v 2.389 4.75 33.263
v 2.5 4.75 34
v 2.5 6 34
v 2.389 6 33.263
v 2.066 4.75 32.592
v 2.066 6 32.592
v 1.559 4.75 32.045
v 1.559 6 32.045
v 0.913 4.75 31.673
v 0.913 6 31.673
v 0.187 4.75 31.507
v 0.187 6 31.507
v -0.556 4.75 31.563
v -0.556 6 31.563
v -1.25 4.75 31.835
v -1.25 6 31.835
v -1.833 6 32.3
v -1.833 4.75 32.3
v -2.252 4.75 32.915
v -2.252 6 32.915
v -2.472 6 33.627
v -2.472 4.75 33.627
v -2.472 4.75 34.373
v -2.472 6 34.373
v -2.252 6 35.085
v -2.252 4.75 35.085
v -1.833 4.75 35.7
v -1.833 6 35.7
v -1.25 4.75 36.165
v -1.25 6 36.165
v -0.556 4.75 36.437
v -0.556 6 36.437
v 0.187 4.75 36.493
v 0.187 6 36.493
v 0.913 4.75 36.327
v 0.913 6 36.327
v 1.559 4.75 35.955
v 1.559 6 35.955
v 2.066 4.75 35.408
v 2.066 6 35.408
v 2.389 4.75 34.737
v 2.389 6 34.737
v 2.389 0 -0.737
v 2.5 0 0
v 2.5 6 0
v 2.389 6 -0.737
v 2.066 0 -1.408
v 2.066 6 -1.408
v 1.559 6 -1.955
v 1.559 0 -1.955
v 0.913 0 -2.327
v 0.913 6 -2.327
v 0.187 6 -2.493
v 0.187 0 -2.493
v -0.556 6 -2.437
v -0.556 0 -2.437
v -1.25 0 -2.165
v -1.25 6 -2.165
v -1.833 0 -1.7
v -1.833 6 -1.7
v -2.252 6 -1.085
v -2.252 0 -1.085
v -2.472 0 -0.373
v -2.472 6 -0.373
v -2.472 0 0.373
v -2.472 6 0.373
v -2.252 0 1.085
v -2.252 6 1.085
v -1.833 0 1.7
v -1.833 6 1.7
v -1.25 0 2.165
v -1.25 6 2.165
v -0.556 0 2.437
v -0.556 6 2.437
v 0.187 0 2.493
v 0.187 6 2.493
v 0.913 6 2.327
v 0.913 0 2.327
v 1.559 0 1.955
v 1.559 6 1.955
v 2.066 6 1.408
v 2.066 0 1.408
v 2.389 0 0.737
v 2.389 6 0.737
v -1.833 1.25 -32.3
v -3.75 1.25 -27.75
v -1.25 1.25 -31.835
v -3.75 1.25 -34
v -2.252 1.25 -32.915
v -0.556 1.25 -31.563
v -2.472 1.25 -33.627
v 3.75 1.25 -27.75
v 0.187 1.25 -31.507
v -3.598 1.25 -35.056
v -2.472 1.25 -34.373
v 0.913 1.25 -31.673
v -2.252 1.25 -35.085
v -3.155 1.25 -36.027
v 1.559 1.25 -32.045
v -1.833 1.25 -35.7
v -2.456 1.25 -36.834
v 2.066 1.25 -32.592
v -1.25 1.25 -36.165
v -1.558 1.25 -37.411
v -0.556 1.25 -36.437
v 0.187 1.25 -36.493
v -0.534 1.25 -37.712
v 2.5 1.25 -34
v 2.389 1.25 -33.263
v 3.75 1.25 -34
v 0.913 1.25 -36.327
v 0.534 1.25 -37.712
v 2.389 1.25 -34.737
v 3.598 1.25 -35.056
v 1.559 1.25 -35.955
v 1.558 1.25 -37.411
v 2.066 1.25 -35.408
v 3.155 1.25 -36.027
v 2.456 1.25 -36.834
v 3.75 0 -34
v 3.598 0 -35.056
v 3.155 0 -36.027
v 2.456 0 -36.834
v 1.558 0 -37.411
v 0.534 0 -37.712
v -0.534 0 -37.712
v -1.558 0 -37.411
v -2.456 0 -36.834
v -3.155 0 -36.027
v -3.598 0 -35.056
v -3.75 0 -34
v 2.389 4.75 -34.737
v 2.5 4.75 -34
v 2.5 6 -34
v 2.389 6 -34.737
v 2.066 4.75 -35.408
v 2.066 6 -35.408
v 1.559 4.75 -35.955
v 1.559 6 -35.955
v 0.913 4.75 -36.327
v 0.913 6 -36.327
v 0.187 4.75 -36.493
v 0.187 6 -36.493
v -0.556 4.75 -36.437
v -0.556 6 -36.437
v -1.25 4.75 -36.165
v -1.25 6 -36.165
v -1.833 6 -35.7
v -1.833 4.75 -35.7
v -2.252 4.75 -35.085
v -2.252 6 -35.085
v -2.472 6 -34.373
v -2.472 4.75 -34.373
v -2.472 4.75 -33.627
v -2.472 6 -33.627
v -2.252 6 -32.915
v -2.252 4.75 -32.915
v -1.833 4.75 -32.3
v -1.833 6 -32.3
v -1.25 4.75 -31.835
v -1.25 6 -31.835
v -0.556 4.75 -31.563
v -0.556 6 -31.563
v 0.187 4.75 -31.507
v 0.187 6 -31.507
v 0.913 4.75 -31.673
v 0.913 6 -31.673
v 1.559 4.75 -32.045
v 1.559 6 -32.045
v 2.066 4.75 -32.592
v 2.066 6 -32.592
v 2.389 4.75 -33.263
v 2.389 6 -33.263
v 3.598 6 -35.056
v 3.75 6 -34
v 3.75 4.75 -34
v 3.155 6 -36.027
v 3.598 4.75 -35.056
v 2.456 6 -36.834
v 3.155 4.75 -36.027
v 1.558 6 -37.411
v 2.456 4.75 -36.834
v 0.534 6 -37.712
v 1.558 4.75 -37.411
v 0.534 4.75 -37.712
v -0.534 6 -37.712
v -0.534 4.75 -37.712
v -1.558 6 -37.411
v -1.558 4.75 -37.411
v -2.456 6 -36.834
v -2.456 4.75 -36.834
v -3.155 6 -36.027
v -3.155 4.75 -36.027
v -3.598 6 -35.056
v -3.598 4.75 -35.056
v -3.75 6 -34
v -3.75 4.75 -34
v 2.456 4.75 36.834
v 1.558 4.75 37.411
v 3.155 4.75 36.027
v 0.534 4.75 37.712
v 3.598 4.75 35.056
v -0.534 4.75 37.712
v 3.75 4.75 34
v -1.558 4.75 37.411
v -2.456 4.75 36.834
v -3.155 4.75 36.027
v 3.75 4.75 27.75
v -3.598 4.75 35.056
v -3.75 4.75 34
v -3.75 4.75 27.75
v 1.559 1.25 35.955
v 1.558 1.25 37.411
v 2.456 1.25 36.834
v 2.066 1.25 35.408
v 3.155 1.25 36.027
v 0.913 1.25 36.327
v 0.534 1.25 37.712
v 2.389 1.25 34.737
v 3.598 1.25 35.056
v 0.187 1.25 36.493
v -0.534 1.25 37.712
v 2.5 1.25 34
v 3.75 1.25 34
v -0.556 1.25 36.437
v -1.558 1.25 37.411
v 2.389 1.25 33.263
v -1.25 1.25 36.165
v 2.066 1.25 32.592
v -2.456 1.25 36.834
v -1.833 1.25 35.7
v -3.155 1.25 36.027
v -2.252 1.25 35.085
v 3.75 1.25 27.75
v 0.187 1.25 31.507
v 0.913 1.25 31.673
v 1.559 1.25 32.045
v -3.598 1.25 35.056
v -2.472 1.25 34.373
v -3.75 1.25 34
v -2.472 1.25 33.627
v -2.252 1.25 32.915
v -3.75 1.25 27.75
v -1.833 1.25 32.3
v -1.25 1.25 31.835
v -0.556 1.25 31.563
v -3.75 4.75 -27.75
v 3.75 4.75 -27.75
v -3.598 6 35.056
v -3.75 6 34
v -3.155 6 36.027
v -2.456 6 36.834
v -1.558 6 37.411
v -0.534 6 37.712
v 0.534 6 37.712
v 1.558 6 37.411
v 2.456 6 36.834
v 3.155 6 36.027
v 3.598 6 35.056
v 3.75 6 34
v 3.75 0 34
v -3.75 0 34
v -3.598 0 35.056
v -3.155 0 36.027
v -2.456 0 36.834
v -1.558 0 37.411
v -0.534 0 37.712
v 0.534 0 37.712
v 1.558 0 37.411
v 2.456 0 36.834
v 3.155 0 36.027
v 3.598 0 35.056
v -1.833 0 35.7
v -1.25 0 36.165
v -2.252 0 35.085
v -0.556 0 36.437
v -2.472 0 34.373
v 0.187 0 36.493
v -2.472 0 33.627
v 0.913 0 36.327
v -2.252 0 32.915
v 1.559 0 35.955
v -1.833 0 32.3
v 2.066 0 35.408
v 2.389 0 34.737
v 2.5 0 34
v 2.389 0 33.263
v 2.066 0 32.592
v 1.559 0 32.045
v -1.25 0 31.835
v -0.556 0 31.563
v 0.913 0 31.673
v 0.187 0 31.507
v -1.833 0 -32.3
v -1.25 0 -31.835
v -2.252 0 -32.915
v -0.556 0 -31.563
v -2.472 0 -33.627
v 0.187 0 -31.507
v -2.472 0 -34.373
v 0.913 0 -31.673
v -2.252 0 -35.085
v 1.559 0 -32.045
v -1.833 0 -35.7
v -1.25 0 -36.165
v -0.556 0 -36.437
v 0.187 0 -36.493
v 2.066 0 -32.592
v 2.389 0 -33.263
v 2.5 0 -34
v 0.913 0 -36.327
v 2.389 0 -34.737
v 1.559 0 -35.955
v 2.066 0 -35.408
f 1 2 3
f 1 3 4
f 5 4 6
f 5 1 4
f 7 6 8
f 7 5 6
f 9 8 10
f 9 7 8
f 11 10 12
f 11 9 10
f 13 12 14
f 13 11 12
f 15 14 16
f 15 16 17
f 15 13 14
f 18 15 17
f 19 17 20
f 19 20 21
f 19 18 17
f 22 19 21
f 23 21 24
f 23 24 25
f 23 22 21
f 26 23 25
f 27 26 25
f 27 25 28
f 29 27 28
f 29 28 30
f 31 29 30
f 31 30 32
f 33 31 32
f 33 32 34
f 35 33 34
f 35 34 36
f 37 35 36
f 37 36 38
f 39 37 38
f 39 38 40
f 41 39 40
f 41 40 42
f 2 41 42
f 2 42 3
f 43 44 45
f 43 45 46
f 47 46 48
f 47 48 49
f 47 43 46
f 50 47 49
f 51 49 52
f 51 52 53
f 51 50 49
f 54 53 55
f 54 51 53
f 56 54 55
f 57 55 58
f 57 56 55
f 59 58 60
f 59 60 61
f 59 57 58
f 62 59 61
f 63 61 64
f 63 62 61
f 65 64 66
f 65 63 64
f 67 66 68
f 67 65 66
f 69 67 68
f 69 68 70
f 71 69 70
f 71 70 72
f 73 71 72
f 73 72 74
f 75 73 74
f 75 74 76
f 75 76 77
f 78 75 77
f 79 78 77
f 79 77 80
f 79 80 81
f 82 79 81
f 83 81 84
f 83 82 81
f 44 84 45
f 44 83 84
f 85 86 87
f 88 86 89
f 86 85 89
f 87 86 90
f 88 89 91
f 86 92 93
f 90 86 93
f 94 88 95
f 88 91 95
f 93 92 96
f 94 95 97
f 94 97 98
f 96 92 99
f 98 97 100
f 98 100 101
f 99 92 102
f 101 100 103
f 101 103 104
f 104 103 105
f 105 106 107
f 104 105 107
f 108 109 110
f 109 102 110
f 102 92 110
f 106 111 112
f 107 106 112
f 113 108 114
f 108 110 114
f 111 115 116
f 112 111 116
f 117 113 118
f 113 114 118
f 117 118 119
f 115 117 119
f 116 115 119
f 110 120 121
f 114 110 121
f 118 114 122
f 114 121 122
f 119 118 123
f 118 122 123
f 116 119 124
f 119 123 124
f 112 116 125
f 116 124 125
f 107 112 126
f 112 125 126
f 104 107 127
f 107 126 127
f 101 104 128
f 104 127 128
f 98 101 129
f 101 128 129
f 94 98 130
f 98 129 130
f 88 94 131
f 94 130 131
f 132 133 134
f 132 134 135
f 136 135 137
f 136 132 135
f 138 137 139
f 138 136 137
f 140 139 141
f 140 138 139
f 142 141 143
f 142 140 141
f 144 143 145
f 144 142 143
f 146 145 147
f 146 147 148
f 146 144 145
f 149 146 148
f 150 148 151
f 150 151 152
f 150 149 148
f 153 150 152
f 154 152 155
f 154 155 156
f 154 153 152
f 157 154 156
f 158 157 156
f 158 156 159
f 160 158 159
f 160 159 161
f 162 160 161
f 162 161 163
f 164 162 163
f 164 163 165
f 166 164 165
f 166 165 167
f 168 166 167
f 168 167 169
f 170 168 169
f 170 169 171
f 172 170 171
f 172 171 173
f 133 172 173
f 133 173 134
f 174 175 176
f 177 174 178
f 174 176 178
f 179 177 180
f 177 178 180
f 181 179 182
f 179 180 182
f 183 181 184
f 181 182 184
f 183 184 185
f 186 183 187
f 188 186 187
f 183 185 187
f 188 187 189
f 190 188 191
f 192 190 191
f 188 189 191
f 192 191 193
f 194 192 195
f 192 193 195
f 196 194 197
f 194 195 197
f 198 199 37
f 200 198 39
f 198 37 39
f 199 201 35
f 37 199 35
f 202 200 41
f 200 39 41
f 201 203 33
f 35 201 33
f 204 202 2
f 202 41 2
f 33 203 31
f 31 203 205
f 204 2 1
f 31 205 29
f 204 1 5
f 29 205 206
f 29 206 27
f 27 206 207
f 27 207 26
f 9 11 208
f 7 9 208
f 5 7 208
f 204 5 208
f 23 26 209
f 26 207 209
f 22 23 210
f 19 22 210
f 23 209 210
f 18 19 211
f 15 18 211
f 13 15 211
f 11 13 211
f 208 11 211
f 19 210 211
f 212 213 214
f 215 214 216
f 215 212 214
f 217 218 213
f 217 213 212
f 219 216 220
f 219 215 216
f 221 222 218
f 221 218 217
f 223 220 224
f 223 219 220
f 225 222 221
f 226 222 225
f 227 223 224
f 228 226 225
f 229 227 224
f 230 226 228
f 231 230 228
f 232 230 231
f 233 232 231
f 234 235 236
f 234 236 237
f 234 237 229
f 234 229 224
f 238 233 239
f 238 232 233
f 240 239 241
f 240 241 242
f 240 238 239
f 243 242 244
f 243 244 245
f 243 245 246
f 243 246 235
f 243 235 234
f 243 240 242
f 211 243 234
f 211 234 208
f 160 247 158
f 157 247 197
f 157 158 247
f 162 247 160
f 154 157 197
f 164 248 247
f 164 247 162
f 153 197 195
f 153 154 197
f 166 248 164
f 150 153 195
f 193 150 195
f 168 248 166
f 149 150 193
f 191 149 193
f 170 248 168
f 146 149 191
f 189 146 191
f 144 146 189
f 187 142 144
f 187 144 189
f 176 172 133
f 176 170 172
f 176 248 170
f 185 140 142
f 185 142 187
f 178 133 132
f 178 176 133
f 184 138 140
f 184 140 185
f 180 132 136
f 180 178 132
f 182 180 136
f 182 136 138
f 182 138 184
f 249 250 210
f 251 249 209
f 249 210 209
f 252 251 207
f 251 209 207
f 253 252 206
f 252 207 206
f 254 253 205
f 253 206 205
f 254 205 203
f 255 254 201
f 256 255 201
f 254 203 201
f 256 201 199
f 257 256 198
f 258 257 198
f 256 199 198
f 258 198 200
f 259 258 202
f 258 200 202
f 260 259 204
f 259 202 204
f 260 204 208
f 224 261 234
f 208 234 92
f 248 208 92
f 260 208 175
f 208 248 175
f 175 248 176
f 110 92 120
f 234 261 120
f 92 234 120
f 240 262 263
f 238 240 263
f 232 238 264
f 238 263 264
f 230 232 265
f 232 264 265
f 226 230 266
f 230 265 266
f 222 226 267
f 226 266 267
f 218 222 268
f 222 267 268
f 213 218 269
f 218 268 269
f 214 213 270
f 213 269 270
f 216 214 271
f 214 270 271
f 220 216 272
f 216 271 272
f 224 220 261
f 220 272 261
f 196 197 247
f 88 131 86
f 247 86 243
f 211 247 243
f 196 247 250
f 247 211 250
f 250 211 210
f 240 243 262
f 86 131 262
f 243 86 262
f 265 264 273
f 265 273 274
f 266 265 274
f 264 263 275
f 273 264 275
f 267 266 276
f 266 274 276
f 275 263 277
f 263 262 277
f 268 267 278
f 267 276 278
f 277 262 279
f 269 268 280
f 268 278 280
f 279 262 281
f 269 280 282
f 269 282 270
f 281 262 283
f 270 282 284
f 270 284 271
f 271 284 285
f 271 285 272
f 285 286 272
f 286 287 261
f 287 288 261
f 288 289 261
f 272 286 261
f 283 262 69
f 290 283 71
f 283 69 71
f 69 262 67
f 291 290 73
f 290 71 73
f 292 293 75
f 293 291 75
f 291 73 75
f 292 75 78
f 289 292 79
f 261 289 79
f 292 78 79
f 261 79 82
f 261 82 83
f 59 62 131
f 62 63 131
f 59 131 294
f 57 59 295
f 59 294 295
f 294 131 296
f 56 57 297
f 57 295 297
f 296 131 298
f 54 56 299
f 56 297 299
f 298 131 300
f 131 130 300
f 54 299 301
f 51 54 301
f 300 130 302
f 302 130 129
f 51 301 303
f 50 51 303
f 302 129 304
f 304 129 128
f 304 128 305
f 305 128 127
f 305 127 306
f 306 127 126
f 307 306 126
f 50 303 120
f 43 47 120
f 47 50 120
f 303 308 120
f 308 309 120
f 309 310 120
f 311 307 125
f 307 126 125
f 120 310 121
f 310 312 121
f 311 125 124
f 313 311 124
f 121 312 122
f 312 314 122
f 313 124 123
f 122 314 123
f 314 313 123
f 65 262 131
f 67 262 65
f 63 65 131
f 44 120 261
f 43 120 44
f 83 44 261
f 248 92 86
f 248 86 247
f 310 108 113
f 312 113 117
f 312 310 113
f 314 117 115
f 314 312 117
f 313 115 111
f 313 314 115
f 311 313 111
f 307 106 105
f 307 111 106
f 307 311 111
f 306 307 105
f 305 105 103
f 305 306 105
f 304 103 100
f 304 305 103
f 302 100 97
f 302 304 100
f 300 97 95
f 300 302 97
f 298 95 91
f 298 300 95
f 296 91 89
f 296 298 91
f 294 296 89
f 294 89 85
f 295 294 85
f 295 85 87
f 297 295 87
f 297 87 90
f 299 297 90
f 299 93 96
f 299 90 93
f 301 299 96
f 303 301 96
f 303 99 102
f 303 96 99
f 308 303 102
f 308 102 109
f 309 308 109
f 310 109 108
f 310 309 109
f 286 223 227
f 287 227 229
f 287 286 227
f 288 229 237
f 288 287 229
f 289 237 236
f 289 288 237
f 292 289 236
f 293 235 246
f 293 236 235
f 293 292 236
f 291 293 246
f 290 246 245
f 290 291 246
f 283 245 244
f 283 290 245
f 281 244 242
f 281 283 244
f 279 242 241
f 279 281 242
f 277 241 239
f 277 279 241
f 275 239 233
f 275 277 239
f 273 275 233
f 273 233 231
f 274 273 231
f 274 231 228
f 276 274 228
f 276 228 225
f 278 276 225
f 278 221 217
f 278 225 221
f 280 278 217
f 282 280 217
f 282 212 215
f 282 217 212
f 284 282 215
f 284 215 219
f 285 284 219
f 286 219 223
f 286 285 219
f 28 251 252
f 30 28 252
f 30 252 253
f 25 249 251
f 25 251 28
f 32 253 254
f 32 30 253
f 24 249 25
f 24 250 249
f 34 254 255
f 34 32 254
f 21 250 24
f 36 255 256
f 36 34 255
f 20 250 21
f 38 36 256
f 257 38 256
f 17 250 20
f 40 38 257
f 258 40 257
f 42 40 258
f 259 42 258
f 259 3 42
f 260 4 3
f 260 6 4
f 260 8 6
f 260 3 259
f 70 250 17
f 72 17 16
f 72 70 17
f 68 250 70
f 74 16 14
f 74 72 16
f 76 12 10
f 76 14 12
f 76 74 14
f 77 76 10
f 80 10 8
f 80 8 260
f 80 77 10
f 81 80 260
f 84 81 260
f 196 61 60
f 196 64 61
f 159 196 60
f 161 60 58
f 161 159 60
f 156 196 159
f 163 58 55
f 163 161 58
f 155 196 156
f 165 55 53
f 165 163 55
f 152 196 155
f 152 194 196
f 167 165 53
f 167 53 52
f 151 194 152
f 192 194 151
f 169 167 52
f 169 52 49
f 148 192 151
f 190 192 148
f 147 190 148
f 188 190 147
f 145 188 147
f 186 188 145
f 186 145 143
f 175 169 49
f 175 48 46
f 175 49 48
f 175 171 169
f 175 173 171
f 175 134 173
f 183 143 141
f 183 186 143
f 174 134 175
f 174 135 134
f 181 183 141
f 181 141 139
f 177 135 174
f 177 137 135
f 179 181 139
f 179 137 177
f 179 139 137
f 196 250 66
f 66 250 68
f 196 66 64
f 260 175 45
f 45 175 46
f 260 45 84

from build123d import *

# Parameters (mm, degrees)
CROQUIS1_R              = 2.5
SALIENTE_EXTRUIR1_DEPTH = 6
CROQUIS2_W              = 12.25
CROQUIS2_H              = 3.5
CORTAR_EXTRUIR1_DEPTH   = 7.5


with BuildPart() as part:
    # Croquis1 → Saliente-Extruir1 (new body)
    with BuildSketch(Plane(origin=(0, 0, 0), x_dir=(1, 0, 0), z_dir=(0, 1, 0))):
        with BuildLine():
            Line((-3.75, 34), (-3.75, -34))
            ThreePointArc((-3.75, -34), (0, -37.75), (3.75, -34))
            Line((3.75, -34), (3.75, 34))
            ThreePointArc((3.75, 34), (0, 37.75), (-3.75, 34))
        make_face()
        with Locations((0, 34)):
            Circle(CROQUIS1_R, mode=Mode.SUBTRACT)
        with Locations((0, -34)):
            Circle(CROQUIS1_R, mode=Mode.SUBTRACT)
        Circle(CROQUIS1_R, mode=Mode.SUBTRACT)
    extrude(amount=SALIENTE_EXTRUIR1_DEPTH)

    # Croquis2 → Cortar-Extruir1 (cut, symmetric)
    with BuildSketch(Plane(origin=(0, 0, 0), x_dir=(0, 0, -1), z_dir=(1, 0, 0))):
        with Locations((-33.875, 3)):
            Rectangle(CROQUIS2_W, CROQUIS2_H)
        with Locations((33.875, 3)):
            Rectangle(CROQUIS2_W, CROQUIS2_H)
    extrude(amount=CORTAR_EXTRUIR1_DEPTH, both=True, mode=Mode.SUBTRACT)


solid = part.part
